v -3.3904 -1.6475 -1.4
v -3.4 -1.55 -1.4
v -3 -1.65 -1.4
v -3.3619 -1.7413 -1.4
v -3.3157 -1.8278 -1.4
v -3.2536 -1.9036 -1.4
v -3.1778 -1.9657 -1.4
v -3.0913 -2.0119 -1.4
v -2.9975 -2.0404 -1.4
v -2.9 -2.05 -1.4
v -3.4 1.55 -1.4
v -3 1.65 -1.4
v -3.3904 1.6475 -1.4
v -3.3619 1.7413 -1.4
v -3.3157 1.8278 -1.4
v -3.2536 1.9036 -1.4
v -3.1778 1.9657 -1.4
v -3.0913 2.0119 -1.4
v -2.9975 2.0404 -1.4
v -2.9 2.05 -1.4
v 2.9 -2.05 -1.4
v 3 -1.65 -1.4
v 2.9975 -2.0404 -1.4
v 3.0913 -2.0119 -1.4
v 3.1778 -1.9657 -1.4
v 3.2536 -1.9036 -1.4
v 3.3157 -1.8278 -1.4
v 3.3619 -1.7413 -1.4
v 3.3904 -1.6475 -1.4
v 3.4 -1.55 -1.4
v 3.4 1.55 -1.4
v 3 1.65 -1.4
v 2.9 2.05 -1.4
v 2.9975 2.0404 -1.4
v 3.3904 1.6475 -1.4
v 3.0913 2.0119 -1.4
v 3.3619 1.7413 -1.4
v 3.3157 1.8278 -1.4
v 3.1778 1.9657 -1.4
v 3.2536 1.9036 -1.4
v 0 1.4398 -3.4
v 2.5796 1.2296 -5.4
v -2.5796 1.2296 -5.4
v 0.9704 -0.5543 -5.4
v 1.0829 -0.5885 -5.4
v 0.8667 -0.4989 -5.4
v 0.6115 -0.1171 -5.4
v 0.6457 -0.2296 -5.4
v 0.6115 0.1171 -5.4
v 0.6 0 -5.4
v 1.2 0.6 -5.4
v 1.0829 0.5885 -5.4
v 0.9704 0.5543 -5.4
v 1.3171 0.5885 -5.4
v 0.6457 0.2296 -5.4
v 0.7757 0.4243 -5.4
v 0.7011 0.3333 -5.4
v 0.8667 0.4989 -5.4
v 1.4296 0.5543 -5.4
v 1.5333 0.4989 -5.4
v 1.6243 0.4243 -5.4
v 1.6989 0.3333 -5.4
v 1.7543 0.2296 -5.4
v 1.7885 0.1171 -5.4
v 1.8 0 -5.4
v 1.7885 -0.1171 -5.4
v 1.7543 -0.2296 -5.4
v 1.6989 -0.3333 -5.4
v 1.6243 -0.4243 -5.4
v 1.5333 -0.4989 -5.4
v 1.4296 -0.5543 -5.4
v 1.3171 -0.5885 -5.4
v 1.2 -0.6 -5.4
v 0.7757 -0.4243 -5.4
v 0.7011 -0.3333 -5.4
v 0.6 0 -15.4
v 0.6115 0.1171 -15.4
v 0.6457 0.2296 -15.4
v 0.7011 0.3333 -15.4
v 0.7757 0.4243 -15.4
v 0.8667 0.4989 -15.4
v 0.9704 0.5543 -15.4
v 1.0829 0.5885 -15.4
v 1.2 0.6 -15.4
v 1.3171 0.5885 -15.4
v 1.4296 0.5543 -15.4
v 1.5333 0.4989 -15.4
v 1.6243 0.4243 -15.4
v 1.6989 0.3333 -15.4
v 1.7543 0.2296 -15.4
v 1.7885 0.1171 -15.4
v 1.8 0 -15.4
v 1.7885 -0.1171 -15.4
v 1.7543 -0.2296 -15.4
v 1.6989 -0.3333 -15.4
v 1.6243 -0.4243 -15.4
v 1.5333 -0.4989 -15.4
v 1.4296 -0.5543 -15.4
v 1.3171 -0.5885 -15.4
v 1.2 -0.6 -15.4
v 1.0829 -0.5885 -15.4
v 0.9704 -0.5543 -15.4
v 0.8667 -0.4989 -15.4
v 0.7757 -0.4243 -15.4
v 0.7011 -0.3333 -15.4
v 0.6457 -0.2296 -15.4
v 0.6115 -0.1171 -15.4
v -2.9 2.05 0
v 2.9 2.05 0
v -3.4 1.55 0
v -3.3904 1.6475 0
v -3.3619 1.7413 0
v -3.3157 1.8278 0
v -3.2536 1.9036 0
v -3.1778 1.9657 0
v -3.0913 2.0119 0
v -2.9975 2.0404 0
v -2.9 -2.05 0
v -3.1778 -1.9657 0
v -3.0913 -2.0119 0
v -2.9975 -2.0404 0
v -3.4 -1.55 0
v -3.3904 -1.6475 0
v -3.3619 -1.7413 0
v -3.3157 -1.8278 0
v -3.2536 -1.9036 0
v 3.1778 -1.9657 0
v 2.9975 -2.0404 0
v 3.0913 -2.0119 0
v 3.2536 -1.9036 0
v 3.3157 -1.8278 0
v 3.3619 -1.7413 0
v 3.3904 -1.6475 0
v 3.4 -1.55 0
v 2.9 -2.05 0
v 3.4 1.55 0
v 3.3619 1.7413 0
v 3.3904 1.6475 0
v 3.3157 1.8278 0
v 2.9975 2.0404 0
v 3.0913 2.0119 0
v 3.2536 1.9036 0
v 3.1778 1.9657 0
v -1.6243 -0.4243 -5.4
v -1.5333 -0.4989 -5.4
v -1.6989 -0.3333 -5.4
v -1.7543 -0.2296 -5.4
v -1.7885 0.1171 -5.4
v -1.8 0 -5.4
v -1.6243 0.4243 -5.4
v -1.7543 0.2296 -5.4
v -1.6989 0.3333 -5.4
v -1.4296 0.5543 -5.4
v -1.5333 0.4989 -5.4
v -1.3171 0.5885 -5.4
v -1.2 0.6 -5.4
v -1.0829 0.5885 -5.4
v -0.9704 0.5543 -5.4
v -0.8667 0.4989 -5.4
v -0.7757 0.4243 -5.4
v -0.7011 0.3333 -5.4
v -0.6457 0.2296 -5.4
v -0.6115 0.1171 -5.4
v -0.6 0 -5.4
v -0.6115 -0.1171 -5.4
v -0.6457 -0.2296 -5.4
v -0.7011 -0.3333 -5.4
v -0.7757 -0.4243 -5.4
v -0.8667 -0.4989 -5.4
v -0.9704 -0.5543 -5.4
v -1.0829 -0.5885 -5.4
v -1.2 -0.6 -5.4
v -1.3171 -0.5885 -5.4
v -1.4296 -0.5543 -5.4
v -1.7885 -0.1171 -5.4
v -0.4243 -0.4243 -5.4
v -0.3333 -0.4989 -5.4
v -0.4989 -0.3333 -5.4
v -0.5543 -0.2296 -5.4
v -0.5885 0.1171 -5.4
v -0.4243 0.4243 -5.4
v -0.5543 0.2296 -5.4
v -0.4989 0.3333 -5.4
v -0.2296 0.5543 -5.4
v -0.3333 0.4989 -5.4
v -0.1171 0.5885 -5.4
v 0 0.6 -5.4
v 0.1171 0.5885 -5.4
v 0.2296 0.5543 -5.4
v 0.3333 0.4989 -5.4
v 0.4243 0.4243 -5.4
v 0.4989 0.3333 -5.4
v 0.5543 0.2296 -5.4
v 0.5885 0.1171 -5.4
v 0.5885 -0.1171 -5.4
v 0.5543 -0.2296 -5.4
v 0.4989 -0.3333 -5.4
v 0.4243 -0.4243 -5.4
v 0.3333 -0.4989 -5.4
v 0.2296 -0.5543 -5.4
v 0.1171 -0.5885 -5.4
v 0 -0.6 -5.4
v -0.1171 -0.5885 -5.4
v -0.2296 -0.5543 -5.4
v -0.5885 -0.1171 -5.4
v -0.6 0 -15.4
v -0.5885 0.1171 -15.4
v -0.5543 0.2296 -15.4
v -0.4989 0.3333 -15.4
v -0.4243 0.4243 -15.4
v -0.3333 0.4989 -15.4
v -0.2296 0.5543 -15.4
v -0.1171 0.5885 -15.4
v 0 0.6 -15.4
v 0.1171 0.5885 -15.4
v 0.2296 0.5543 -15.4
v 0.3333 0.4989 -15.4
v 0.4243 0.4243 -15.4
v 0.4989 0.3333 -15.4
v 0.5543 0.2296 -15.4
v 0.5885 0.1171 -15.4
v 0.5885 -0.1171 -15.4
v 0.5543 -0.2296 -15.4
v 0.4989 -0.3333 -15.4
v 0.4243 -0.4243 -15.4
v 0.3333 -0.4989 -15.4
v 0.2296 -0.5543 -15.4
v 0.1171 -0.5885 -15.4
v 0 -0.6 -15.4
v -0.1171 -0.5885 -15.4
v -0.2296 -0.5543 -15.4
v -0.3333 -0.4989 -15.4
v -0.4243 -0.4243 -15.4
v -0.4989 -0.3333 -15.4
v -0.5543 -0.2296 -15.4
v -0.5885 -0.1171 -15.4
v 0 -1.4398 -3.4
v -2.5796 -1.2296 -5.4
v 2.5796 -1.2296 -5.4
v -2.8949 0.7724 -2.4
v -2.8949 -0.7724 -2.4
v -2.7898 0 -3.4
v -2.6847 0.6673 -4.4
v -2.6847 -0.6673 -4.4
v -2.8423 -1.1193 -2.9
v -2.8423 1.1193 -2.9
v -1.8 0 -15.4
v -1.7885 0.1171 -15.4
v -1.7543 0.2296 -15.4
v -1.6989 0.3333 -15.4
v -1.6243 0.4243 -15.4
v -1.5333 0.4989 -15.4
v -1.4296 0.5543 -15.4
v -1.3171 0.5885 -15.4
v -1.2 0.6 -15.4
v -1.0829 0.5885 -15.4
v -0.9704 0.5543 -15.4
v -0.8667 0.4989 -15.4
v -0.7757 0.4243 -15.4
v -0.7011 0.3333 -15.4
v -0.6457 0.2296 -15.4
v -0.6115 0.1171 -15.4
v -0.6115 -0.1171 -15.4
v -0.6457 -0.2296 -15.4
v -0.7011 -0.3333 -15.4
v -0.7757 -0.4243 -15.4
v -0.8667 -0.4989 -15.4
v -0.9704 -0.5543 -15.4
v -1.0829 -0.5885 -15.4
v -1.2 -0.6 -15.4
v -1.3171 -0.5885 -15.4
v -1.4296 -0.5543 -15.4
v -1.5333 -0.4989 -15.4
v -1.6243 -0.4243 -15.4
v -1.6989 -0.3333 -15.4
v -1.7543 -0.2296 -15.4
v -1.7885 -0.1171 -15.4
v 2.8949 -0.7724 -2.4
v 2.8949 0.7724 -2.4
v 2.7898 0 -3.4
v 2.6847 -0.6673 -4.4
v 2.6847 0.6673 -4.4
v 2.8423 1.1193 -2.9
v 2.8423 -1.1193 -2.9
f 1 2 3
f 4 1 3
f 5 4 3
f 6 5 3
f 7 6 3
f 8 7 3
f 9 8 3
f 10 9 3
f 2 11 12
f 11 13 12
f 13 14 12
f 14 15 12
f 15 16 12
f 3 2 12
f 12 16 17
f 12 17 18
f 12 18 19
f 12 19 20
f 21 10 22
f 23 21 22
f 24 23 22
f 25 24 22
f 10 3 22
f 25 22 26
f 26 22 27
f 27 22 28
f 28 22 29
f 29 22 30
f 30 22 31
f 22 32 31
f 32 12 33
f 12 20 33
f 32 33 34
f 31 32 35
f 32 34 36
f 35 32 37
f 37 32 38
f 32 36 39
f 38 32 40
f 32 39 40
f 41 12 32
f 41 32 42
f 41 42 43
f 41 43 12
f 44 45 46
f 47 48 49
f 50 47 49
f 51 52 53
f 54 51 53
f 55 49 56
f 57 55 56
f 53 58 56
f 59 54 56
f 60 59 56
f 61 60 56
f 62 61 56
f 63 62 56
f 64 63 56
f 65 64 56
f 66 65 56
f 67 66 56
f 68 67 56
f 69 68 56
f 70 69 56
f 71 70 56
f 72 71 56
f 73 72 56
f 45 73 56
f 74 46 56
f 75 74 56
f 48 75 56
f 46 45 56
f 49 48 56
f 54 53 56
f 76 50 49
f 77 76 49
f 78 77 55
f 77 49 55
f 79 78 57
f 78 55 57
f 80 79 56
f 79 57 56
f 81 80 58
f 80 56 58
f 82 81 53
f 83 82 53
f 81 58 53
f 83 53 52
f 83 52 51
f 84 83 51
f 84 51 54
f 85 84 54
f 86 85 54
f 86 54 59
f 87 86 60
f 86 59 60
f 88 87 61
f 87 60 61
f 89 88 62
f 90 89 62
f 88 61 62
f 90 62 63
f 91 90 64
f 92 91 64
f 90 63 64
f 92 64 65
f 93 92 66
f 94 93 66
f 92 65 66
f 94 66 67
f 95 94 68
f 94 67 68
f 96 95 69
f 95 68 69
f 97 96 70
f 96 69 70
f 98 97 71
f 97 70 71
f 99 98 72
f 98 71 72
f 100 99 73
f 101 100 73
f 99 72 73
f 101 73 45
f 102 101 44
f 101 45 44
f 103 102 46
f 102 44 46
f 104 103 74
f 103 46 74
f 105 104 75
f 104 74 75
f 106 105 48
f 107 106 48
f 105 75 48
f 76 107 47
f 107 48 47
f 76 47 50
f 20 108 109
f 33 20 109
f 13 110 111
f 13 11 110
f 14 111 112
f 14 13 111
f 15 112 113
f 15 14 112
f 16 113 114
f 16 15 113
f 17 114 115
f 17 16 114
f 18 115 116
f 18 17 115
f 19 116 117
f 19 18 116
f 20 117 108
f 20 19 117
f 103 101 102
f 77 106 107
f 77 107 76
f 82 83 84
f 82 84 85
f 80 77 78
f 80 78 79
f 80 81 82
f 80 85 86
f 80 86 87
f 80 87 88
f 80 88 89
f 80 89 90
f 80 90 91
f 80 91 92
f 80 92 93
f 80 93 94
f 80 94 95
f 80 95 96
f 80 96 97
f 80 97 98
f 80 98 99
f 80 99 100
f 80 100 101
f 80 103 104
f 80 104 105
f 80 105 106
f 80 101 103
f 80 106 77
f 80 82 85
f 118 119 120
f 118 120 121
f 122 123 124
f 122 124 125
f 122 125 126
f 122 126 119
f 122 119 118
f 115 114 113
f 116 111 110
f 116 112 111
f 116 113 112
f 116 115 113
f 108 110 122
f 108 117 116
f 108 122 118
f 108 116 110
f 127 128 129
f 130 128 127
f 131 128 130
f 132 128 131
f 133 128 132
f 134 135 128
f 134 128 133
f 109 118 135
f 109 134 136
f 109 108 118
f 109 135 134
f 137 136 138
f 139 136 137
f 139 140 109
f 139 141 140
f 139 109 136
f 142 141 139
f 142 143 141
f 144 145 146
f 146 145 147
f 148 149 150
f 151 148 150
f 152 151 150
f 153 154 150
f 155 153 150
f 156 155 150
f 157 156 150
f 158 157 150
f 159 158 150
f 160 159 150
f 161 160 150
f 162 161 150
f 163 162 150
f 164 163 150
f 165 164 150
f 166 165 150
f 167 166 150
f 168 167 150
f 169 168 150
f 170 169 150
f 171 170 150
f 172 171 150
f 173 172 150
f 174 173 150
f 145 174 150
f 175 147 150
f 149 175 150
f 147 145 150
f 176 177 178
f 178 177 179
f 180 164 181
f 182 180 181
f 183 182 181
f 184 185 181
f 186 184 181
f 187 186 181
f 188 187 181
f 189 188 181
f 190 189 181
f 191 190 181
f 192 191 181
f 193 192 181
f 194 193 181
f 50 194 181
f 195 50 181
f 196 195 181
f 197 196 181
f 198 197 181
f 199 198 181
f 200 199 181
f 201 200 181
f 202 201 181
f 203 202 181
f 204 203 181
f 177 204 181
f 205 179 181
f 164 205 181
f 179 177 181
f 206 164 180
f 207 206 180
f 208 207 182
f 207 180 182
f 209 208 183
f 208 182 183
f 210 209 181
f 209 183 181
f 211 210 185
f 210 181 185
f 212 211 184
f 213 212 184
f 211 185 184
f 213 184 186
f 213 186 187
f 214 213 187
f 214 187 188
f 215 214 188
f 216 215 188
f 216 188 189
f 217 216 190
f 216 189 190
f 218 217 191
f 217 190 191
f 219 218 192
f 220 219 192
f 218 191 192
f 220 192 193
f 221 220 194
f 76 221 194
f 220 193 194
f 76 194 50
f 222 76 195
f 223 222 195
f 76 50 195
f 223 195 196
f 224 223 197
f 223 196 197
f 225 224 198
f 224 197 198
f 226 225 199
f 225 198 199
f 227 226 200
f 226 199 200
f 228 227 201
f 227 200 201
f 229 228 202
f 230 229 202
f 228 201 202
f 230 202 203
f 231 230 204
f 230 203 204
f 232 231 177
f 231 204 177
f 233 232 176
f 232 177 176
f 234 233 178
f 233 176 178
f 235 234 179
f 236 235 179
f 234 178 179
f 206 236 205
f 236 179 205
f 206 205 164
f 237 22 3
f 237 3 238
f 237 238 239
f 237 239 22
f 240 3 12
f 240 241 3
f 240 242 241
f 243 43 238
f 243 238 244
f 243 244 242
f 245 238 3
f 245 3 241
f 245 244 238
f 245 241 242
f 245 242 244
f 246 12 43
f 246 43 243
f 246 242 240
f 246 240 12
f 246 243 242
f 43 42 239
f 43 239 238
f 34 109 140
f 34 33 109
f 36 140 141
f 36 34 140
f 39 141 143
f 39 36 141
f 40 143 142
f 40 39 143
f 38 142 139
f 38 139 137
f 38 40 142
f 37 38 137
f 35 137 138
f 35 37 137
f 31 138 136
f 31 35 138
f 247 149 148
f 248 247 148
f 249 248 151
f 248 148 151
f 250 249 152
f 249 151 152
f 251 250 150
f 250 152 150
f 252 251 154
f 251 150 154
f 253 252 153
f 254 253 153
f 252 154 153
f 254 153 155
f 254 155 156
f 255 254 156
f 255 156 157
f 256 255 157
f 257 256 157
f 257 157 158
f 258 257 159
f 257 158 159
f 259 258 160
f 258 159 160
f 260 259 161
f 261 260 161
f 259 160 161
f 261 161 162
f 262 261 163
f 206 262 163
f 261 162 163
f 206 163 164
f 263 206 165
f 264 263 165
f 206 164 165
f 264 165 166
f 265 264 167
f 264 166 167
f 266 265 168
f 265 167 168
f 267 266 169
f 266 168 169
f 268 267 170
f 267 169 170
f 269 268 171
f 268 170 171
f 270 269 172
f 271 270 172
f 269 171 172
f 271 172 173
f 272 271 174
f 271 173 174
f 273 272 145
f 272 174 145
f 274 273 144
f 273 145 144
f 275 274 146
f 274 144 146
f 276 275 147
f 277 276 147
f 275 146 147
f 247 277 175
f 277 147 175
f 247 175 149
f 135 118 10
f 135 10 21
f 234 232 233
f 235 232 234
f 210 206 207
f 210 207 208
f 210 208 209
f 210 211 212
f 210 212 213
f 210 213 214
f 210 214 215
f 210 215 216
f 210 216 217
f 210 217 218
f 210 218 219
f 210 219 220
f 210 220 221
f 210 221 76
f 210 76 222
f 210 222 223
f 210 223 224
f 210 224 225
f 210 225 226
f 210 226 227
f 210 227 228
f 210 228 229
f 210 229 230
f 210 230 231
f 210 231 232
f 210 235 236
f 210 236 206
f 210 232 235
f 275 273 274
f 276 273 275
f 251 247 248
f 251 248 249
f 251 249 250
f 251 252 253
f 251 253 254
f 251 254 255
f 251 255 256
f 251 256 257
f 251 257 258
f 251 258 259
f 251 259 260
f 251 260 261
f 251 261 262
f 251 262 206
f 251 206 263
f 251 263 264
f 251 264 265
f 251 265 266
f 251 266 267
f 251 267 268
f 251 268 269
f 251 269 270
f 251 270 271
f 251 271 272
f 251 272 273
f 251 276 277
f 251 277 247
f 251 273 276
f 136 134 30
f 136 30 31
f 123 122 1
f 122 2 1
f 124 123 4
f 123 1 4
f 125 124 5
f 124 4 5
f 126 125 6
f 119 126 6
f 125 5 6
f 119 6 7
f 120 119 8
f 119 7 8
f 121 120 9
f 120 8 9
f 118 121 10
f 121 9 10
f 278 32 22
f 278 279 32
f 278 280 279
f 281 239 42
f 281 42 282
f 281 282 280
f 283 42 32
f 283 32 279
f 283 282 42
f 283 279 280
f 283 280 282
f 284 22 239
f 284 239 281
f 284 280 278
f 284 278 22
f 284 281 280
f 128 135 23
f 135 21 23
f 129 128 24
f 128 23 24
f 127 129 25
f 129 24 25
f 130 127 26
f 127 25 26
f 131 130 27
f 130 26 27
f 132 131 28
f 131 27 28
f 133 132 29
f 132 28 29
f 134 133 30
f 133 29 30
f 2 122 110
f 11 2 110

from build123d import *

# Parameters (mm, degrees)
SKETCH1_W           = 6.8
SKETCH1_H           = 4.1
BOSS_EXTRUDE1_DEPTH = 1.4
SKETCH2_W           = 6
SKETCH2_H           = 3.3
BOSS_EXTRUDE2_DEPTH = 4
BOSS_EXTRUDE2_TAPER = 6
FILLET1_R           = 0.5
SKETCH3_R           = 0.6
POSITIVE_DEPTH      = 10
SKETCH4_R           = 0.6
SIGNAL_DEPTH        = 10
SKETCH5_R           = 0.6
NEGATIVE_DEPTH      = 10


with BuildPart() as part:
    # Sketch1 → Boss-Extrude1 (new body)
    with BuildSketch(Plane.XY):
        Rectangle(SKETCH1_W, SKETCH1_H)
    extrude(amount=-BOSS_EXTRUDE1_DEPTH)

    # Sketch2 → Boss-Extrude2 (add)
    with BuildSketch(Plane(origin=(0, 0, -1.4), x_dir=(-1, 0, 0), z_dir=(0, 0, -1))):
        Rectangle(SKETCH2_W, SKETCH2_H)
    extrude(amount=BOSS_EXTRUDE2_DEPTH, taper=BOSS_EXTRUDE2_TAPER)

    # Fillet1
    fillet1_edges = [part.edges().sort_by_distance(p)[0] for p in [
        (3.4, -2.05, -0.7),
        (-3.4, -2.05, -0.7),
        (-3.4, 2.05, -0.7),
        (3.4, 2.05, -0.7),
    ]]
    fillet(fillet1_edges, radius=FILLET1_R)


with BuildPart() as body_2:
    # Sketch3 → POSITIVE (new body)
    with BuildSketch(Plane(origin=(0, 0, -5.4), x_dir=(-1, 0, 0), z_dir=(0, 0, -1))):
        Circle(SKETCH3_R)
    extrude(amount=POSITIVE_DEPTH)


with BuildPart() as body_3:
    # Sketch4 → SIGNAL (new body)
    with BuildSketch(Plane(origin=(0, 0, -5.4), x_dir=(-1, 0, 0), z_dir=(0, 0, -1))):
        with Locations((1.2, 0)):
            Circle(SKETCH4_R)
    extrude(amount=SIGNAL_DEPTH)


with BuildPart() as body_4:
    # Sketch5 → NEGATIVE (new body)
    with BuildSketch(Plane(origin=(0, 0, -5.4), x_dir=(-1, 0, 0), z_dir=(0, 0, -1))):
        with Locations((-1.2, 0)):
            Circle(SKETCH5_R)
    extrude(amount=NEGATIVE_DEPTH)


solid = Compound([part.part, body_2.part, body_3.part, body_4.part])
